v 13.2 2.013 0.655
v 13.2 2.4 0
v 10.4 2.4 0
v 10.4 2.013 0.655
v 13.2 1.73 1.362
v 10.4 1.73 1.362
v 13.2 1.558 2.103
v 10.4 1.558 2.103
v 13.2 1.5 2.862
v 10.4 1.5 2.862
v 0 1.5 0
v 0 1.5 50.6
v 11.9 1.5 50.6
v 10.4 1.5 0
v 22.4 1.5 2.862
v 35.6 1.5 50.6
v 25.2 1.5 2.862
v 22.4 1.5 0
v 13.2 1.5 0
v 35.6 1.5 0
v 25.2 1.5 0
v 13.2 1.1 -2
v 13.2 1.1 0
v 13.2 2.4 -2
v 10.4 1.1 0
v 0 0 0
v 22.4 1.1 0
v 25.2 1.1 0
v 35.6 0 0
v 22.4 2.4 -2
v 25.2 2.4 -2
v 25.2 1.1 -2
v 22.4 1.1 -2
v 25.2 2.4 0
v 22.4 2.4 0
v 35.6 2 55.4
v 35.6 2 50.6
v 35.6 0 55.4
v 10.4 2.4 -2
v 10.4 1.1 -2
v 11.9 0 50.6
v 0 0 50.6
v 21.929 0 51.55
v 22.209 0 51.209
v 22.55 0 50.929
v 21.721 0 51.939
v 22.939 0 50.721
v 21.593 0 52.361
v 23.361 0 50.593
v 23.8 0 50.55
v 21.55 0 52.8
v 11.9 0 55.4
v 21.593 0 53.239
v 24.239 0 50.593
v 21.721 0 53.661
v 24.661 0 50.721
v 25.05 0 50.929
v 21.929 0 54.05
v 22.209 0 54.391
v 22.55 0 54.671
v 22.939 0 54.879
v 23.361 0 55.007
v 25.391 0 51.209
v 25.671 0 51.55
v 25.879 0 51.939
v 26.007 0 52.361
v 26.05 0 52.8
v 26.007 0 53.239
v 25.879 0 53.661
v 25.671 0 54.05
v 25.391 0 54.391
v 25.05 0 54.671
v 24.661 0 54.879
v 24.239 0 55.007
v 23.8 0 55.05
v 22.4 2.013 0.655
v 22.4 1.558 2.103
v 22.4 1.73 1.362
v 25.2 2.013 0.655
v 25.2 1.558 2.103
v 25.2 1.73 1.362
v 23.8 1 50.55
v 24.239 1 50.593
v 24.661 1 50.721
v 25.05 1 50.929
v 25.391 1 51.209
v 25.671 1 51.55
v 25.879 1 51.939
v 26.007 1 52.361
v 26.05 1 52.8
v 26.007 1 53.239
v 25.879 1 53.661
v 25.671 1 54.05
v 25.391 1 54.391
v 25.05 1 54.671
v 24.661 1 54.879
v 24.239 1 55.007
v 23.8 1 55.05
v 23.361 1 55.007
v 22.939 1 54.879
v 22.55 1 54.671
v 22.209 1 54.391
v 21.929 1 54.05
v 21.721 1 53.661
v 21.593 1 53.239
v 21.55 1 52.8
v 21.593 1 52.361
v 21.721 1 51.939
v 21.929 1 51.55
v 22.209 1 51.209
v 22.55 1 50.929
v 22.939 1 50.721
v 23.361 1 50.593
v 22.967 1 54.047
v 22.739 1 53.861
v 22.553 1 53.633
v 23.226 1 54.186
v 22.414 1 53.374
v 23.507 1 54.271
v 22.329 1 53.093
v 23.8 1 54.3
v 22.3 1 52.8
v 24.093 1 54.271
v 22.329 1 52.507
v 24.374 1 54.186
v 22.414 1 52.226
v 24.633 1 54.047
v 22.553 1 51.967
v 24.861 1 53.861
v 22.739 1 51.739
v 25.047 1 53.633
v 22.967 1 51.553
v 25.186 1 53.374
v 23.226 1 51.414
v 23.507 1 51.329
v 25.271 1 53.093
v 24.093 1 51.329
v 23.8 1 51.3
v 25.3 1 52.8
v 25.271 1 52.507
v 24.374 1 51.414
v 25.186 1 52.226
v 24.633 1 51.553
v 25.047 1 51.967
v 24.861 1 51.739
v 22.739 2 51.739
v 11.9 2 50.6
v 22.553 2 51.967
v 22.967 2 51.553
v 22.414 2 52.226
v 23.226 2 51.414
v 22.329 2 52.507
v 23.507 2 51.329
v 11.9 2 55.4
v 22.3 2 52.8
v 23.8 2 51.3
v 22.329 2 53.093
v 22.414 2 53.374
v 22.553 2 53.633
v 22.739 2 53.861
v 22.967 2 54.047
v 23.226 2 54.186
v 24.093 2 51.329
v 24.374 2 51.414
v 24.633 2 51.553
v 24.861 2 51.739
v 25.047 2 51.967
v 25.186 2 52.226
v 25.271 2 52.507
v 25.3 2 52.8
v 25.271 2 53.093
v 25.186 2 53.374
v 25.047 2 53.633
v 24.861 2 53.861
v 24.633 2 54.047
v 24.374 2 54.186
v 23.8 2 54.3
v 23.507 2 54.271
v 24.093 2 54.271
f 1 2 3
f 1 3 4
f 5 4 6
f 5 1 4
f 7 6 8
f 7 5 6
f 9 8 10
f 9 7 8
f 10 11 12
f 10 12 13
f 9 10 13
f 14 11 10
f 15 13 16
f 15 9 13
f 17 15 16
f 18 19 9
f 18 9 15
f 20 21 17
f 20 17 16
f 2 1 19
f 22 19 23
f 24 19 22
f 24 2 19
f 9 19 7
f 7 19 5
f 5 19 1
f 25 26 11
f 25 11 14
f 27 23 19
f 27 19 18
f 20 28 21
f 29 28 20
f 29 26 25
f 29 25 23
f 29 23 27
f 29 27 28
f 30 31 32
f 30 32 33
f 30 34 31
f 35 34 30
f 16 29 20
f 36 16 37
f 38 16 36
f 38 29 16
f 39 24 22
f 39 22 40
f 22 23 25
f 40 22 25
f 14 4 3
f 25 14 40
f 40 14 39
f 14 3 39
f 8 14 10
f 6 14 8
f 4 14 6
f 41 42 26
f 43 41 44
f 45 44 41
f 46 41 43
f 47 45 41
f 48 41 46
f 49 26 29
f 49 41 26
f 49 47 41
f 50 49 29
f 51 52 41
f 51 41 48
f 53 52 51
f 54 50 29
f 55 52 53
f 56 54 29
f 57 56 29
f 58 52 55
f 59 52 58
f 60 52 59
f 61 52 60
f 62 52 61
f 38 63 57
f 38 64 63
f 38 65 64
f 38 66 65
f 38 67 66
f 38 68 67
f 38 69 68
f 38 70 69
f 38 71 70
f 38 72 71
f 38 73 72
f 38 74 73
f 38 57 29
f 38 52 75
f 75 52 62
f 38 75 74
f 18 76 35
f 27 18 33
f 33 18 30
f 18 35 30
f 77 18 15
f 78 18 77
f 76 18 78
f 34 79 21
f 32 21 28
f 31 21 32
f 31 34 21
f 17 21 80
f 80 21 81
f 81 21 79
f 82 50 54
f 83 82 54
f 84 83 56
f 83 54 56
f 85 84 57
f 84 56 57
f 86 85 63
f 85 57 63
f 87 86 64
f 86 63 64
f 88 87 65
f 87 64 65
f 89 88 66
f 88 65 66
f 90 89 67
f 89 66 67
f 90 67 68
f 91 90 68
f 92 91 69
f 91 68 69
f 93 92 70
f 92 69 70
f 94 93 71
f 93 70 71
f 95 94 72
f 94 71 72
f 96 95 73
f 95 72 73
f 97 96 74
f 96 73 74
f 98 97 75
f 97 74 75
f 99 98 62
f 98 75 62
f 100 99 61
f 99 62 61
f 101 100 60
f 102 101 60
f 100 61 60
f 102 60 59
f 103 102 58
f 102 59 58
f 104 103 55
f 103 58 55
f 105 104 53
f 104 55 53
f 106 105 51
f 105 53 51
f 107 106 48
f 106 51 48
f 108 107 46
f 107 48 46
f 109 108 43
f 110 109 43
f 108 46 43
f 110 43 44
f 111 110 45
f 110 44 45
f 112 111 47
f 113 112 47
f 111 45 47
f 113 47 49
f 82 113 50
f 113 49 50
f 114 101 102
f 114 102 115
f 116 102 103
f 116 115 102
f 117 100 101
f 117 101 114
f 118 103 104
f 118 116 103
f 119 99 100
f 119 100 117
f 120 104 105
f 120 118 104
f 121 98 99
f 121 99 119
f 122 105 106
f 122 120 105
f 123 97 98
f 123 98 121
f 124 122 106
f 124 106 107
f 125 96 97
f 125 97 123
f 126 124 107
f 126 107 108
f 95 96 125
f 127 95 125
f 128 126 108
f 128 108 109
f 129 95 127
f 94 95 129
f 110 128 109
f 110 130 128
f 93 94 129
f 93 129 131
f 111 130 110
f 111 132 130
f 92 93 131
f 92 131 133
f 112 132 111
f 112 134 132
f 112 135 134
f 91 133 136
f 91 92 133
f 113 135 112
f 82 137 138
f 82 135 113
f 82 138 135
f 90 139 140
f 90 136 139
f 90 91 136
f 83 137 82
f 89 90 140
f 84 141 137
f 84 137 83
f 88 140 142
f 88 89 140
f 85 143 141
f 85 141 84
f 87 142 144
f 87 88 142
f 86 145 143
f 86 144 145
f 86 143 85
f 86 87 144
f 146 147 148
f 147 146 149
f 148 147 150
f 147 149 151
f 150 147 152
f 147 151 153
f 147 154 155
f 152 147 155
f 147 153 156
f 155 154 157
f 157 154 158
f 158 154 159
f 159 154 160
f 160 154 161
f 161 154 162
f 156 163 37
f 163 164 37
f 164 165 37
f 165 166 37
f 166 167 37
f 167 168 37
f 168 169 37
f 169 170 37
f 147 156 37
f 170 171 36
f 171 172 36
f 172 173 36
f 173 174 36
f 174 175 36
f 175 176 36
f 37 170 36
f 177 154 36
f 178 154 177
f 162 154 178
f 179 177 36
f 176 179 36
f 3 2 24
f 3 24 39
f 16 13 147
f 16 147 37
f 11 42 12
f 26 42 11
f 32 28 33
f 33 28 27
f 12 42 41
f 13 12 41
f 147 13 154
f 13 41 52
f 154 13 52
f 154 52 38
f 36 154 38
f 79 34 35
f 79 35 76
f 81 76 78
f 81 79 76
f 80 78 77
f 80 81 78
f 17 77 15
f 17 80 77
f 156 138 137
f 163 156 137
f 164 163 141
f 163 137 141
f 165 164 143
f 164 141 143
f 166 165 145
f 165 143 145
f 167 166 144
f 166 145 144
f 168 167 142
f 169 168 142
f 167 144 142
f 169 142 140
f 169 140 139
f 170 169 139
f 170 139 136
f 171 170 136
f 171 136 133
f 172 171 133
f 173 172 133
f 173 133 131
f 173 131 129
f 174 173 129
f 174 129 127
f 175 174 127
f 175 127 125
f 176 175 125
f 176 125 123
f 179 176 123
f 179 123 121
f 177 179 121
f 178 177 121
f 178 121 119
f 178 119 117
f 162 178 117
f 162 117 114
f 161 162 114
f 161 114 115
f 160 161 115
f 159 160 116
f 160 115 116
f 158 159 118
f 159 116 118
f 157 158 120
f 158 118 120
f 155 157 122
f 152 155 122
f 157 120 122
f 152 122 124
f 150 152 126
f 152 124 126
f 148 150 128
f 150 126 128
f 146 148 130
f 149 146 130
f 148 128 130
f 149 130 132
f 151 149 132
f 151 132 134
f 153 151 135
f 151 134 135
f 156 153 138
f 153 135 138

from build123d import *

# Parameters (mm, degrees)
SKETCH_1_W          = 35.6
SKETCH_1_H          = 50.6
EXTRUDE_1_DEPTH     = 1.5
SKETCH_2_W          = 23.7
SKETCH_2_H          = 4.8
SKETCH_2_R          = 1.5
EXTRUDE_2_DEPTH     = 2
SKETCH_2_3_R        = 2.25
CUT_EXTRUDE_1_DEPTH = 1
SKETCH_3_W          = 2.8
SKETCH_3_H          = 1.3
EXTRUDE_3_DEPTH     = 2
FILLET_1_R          = 5


with BuildPart() as part:
    # 草图1 → 凸台-拉伸1 (new body)
    with BuildSketch(Plane(origin=(0, 0, 0), x_dir=(1, 0, 0), z_dir=(0, 1, 0))):
        with Locations((17.8, -25.3)):
            Rectangle(SKETCH_1_W, SKETCH_1_H)
    extrude(amount=EXTRUDE_1_DEPTH)

    # 草图2 → 凸台-拉伸2 (add)
    with BuildSketch(Plane.XZ):
        with Locations((23.75, 53)):
            Rectangle(SKETCH_2_W, SKETCH_2_H)
        with Locations(Location((23.8, 52.8, 0), (0, 0, 270))):
            Circle(SKETCH_2_R, mode=Mode.SUBTRACT)
    extrude(amount=-EXTRUDE_2_DEPTH)

    # 草图2<3> → 切除-拉伸1 (cut)
    with BuildSketch(Plane.XZ):
        with Locations(Location((23.8, 52.8, 0), (0, 0, 270))):
            Circle(SKETCH_2_3_R)
    extrude(amount=-CUT_EXTRUDE_1_DEPTH, mode=Mode.SUBTRACT)

    # 草图3 → 凸台-拉伸3 (add)
    with BuildSketch(Plane(origin=(0, 0, 0), x_dir=(-1, 0, 0), z_dir=(0, 0, -1))):
        with Locations((-23.8, 1.75)):
            Rectangle(SKETCH_3_W, SKETCH_3_H)
        with Locations((-11.8, 1.75)):
            Rectangle(SKETCH_3_W, SKETCH_3_H)
    extrude(amount=EXTRUDE_3_DEPTH)

    # 圆角1
    # the kernel refuses this fillet: 5 mm, written as the material it adds along each edge
    with BuildSketch(Plane(origin=(13.2, 1.5, 0), x_dir=(0, 0, 1), z_dir=(-1, 0, 0)), Plane(origin=(25.2, 1.5, 0), x_dir=(0, 0, 1), z_dir=(-1, 0, 0))) as fillet_1_piece_1:
        with BuildLine():
            CenterArc((2.861817604, 5), FILLET_1_R, 235.084793753, 34.915206247)
            Line((0, 0.9), (0, 0))
            Line((0, 0), (2.861817604, 0))
        make_face()
    extrude(amount=2.8)


solid = part.part
